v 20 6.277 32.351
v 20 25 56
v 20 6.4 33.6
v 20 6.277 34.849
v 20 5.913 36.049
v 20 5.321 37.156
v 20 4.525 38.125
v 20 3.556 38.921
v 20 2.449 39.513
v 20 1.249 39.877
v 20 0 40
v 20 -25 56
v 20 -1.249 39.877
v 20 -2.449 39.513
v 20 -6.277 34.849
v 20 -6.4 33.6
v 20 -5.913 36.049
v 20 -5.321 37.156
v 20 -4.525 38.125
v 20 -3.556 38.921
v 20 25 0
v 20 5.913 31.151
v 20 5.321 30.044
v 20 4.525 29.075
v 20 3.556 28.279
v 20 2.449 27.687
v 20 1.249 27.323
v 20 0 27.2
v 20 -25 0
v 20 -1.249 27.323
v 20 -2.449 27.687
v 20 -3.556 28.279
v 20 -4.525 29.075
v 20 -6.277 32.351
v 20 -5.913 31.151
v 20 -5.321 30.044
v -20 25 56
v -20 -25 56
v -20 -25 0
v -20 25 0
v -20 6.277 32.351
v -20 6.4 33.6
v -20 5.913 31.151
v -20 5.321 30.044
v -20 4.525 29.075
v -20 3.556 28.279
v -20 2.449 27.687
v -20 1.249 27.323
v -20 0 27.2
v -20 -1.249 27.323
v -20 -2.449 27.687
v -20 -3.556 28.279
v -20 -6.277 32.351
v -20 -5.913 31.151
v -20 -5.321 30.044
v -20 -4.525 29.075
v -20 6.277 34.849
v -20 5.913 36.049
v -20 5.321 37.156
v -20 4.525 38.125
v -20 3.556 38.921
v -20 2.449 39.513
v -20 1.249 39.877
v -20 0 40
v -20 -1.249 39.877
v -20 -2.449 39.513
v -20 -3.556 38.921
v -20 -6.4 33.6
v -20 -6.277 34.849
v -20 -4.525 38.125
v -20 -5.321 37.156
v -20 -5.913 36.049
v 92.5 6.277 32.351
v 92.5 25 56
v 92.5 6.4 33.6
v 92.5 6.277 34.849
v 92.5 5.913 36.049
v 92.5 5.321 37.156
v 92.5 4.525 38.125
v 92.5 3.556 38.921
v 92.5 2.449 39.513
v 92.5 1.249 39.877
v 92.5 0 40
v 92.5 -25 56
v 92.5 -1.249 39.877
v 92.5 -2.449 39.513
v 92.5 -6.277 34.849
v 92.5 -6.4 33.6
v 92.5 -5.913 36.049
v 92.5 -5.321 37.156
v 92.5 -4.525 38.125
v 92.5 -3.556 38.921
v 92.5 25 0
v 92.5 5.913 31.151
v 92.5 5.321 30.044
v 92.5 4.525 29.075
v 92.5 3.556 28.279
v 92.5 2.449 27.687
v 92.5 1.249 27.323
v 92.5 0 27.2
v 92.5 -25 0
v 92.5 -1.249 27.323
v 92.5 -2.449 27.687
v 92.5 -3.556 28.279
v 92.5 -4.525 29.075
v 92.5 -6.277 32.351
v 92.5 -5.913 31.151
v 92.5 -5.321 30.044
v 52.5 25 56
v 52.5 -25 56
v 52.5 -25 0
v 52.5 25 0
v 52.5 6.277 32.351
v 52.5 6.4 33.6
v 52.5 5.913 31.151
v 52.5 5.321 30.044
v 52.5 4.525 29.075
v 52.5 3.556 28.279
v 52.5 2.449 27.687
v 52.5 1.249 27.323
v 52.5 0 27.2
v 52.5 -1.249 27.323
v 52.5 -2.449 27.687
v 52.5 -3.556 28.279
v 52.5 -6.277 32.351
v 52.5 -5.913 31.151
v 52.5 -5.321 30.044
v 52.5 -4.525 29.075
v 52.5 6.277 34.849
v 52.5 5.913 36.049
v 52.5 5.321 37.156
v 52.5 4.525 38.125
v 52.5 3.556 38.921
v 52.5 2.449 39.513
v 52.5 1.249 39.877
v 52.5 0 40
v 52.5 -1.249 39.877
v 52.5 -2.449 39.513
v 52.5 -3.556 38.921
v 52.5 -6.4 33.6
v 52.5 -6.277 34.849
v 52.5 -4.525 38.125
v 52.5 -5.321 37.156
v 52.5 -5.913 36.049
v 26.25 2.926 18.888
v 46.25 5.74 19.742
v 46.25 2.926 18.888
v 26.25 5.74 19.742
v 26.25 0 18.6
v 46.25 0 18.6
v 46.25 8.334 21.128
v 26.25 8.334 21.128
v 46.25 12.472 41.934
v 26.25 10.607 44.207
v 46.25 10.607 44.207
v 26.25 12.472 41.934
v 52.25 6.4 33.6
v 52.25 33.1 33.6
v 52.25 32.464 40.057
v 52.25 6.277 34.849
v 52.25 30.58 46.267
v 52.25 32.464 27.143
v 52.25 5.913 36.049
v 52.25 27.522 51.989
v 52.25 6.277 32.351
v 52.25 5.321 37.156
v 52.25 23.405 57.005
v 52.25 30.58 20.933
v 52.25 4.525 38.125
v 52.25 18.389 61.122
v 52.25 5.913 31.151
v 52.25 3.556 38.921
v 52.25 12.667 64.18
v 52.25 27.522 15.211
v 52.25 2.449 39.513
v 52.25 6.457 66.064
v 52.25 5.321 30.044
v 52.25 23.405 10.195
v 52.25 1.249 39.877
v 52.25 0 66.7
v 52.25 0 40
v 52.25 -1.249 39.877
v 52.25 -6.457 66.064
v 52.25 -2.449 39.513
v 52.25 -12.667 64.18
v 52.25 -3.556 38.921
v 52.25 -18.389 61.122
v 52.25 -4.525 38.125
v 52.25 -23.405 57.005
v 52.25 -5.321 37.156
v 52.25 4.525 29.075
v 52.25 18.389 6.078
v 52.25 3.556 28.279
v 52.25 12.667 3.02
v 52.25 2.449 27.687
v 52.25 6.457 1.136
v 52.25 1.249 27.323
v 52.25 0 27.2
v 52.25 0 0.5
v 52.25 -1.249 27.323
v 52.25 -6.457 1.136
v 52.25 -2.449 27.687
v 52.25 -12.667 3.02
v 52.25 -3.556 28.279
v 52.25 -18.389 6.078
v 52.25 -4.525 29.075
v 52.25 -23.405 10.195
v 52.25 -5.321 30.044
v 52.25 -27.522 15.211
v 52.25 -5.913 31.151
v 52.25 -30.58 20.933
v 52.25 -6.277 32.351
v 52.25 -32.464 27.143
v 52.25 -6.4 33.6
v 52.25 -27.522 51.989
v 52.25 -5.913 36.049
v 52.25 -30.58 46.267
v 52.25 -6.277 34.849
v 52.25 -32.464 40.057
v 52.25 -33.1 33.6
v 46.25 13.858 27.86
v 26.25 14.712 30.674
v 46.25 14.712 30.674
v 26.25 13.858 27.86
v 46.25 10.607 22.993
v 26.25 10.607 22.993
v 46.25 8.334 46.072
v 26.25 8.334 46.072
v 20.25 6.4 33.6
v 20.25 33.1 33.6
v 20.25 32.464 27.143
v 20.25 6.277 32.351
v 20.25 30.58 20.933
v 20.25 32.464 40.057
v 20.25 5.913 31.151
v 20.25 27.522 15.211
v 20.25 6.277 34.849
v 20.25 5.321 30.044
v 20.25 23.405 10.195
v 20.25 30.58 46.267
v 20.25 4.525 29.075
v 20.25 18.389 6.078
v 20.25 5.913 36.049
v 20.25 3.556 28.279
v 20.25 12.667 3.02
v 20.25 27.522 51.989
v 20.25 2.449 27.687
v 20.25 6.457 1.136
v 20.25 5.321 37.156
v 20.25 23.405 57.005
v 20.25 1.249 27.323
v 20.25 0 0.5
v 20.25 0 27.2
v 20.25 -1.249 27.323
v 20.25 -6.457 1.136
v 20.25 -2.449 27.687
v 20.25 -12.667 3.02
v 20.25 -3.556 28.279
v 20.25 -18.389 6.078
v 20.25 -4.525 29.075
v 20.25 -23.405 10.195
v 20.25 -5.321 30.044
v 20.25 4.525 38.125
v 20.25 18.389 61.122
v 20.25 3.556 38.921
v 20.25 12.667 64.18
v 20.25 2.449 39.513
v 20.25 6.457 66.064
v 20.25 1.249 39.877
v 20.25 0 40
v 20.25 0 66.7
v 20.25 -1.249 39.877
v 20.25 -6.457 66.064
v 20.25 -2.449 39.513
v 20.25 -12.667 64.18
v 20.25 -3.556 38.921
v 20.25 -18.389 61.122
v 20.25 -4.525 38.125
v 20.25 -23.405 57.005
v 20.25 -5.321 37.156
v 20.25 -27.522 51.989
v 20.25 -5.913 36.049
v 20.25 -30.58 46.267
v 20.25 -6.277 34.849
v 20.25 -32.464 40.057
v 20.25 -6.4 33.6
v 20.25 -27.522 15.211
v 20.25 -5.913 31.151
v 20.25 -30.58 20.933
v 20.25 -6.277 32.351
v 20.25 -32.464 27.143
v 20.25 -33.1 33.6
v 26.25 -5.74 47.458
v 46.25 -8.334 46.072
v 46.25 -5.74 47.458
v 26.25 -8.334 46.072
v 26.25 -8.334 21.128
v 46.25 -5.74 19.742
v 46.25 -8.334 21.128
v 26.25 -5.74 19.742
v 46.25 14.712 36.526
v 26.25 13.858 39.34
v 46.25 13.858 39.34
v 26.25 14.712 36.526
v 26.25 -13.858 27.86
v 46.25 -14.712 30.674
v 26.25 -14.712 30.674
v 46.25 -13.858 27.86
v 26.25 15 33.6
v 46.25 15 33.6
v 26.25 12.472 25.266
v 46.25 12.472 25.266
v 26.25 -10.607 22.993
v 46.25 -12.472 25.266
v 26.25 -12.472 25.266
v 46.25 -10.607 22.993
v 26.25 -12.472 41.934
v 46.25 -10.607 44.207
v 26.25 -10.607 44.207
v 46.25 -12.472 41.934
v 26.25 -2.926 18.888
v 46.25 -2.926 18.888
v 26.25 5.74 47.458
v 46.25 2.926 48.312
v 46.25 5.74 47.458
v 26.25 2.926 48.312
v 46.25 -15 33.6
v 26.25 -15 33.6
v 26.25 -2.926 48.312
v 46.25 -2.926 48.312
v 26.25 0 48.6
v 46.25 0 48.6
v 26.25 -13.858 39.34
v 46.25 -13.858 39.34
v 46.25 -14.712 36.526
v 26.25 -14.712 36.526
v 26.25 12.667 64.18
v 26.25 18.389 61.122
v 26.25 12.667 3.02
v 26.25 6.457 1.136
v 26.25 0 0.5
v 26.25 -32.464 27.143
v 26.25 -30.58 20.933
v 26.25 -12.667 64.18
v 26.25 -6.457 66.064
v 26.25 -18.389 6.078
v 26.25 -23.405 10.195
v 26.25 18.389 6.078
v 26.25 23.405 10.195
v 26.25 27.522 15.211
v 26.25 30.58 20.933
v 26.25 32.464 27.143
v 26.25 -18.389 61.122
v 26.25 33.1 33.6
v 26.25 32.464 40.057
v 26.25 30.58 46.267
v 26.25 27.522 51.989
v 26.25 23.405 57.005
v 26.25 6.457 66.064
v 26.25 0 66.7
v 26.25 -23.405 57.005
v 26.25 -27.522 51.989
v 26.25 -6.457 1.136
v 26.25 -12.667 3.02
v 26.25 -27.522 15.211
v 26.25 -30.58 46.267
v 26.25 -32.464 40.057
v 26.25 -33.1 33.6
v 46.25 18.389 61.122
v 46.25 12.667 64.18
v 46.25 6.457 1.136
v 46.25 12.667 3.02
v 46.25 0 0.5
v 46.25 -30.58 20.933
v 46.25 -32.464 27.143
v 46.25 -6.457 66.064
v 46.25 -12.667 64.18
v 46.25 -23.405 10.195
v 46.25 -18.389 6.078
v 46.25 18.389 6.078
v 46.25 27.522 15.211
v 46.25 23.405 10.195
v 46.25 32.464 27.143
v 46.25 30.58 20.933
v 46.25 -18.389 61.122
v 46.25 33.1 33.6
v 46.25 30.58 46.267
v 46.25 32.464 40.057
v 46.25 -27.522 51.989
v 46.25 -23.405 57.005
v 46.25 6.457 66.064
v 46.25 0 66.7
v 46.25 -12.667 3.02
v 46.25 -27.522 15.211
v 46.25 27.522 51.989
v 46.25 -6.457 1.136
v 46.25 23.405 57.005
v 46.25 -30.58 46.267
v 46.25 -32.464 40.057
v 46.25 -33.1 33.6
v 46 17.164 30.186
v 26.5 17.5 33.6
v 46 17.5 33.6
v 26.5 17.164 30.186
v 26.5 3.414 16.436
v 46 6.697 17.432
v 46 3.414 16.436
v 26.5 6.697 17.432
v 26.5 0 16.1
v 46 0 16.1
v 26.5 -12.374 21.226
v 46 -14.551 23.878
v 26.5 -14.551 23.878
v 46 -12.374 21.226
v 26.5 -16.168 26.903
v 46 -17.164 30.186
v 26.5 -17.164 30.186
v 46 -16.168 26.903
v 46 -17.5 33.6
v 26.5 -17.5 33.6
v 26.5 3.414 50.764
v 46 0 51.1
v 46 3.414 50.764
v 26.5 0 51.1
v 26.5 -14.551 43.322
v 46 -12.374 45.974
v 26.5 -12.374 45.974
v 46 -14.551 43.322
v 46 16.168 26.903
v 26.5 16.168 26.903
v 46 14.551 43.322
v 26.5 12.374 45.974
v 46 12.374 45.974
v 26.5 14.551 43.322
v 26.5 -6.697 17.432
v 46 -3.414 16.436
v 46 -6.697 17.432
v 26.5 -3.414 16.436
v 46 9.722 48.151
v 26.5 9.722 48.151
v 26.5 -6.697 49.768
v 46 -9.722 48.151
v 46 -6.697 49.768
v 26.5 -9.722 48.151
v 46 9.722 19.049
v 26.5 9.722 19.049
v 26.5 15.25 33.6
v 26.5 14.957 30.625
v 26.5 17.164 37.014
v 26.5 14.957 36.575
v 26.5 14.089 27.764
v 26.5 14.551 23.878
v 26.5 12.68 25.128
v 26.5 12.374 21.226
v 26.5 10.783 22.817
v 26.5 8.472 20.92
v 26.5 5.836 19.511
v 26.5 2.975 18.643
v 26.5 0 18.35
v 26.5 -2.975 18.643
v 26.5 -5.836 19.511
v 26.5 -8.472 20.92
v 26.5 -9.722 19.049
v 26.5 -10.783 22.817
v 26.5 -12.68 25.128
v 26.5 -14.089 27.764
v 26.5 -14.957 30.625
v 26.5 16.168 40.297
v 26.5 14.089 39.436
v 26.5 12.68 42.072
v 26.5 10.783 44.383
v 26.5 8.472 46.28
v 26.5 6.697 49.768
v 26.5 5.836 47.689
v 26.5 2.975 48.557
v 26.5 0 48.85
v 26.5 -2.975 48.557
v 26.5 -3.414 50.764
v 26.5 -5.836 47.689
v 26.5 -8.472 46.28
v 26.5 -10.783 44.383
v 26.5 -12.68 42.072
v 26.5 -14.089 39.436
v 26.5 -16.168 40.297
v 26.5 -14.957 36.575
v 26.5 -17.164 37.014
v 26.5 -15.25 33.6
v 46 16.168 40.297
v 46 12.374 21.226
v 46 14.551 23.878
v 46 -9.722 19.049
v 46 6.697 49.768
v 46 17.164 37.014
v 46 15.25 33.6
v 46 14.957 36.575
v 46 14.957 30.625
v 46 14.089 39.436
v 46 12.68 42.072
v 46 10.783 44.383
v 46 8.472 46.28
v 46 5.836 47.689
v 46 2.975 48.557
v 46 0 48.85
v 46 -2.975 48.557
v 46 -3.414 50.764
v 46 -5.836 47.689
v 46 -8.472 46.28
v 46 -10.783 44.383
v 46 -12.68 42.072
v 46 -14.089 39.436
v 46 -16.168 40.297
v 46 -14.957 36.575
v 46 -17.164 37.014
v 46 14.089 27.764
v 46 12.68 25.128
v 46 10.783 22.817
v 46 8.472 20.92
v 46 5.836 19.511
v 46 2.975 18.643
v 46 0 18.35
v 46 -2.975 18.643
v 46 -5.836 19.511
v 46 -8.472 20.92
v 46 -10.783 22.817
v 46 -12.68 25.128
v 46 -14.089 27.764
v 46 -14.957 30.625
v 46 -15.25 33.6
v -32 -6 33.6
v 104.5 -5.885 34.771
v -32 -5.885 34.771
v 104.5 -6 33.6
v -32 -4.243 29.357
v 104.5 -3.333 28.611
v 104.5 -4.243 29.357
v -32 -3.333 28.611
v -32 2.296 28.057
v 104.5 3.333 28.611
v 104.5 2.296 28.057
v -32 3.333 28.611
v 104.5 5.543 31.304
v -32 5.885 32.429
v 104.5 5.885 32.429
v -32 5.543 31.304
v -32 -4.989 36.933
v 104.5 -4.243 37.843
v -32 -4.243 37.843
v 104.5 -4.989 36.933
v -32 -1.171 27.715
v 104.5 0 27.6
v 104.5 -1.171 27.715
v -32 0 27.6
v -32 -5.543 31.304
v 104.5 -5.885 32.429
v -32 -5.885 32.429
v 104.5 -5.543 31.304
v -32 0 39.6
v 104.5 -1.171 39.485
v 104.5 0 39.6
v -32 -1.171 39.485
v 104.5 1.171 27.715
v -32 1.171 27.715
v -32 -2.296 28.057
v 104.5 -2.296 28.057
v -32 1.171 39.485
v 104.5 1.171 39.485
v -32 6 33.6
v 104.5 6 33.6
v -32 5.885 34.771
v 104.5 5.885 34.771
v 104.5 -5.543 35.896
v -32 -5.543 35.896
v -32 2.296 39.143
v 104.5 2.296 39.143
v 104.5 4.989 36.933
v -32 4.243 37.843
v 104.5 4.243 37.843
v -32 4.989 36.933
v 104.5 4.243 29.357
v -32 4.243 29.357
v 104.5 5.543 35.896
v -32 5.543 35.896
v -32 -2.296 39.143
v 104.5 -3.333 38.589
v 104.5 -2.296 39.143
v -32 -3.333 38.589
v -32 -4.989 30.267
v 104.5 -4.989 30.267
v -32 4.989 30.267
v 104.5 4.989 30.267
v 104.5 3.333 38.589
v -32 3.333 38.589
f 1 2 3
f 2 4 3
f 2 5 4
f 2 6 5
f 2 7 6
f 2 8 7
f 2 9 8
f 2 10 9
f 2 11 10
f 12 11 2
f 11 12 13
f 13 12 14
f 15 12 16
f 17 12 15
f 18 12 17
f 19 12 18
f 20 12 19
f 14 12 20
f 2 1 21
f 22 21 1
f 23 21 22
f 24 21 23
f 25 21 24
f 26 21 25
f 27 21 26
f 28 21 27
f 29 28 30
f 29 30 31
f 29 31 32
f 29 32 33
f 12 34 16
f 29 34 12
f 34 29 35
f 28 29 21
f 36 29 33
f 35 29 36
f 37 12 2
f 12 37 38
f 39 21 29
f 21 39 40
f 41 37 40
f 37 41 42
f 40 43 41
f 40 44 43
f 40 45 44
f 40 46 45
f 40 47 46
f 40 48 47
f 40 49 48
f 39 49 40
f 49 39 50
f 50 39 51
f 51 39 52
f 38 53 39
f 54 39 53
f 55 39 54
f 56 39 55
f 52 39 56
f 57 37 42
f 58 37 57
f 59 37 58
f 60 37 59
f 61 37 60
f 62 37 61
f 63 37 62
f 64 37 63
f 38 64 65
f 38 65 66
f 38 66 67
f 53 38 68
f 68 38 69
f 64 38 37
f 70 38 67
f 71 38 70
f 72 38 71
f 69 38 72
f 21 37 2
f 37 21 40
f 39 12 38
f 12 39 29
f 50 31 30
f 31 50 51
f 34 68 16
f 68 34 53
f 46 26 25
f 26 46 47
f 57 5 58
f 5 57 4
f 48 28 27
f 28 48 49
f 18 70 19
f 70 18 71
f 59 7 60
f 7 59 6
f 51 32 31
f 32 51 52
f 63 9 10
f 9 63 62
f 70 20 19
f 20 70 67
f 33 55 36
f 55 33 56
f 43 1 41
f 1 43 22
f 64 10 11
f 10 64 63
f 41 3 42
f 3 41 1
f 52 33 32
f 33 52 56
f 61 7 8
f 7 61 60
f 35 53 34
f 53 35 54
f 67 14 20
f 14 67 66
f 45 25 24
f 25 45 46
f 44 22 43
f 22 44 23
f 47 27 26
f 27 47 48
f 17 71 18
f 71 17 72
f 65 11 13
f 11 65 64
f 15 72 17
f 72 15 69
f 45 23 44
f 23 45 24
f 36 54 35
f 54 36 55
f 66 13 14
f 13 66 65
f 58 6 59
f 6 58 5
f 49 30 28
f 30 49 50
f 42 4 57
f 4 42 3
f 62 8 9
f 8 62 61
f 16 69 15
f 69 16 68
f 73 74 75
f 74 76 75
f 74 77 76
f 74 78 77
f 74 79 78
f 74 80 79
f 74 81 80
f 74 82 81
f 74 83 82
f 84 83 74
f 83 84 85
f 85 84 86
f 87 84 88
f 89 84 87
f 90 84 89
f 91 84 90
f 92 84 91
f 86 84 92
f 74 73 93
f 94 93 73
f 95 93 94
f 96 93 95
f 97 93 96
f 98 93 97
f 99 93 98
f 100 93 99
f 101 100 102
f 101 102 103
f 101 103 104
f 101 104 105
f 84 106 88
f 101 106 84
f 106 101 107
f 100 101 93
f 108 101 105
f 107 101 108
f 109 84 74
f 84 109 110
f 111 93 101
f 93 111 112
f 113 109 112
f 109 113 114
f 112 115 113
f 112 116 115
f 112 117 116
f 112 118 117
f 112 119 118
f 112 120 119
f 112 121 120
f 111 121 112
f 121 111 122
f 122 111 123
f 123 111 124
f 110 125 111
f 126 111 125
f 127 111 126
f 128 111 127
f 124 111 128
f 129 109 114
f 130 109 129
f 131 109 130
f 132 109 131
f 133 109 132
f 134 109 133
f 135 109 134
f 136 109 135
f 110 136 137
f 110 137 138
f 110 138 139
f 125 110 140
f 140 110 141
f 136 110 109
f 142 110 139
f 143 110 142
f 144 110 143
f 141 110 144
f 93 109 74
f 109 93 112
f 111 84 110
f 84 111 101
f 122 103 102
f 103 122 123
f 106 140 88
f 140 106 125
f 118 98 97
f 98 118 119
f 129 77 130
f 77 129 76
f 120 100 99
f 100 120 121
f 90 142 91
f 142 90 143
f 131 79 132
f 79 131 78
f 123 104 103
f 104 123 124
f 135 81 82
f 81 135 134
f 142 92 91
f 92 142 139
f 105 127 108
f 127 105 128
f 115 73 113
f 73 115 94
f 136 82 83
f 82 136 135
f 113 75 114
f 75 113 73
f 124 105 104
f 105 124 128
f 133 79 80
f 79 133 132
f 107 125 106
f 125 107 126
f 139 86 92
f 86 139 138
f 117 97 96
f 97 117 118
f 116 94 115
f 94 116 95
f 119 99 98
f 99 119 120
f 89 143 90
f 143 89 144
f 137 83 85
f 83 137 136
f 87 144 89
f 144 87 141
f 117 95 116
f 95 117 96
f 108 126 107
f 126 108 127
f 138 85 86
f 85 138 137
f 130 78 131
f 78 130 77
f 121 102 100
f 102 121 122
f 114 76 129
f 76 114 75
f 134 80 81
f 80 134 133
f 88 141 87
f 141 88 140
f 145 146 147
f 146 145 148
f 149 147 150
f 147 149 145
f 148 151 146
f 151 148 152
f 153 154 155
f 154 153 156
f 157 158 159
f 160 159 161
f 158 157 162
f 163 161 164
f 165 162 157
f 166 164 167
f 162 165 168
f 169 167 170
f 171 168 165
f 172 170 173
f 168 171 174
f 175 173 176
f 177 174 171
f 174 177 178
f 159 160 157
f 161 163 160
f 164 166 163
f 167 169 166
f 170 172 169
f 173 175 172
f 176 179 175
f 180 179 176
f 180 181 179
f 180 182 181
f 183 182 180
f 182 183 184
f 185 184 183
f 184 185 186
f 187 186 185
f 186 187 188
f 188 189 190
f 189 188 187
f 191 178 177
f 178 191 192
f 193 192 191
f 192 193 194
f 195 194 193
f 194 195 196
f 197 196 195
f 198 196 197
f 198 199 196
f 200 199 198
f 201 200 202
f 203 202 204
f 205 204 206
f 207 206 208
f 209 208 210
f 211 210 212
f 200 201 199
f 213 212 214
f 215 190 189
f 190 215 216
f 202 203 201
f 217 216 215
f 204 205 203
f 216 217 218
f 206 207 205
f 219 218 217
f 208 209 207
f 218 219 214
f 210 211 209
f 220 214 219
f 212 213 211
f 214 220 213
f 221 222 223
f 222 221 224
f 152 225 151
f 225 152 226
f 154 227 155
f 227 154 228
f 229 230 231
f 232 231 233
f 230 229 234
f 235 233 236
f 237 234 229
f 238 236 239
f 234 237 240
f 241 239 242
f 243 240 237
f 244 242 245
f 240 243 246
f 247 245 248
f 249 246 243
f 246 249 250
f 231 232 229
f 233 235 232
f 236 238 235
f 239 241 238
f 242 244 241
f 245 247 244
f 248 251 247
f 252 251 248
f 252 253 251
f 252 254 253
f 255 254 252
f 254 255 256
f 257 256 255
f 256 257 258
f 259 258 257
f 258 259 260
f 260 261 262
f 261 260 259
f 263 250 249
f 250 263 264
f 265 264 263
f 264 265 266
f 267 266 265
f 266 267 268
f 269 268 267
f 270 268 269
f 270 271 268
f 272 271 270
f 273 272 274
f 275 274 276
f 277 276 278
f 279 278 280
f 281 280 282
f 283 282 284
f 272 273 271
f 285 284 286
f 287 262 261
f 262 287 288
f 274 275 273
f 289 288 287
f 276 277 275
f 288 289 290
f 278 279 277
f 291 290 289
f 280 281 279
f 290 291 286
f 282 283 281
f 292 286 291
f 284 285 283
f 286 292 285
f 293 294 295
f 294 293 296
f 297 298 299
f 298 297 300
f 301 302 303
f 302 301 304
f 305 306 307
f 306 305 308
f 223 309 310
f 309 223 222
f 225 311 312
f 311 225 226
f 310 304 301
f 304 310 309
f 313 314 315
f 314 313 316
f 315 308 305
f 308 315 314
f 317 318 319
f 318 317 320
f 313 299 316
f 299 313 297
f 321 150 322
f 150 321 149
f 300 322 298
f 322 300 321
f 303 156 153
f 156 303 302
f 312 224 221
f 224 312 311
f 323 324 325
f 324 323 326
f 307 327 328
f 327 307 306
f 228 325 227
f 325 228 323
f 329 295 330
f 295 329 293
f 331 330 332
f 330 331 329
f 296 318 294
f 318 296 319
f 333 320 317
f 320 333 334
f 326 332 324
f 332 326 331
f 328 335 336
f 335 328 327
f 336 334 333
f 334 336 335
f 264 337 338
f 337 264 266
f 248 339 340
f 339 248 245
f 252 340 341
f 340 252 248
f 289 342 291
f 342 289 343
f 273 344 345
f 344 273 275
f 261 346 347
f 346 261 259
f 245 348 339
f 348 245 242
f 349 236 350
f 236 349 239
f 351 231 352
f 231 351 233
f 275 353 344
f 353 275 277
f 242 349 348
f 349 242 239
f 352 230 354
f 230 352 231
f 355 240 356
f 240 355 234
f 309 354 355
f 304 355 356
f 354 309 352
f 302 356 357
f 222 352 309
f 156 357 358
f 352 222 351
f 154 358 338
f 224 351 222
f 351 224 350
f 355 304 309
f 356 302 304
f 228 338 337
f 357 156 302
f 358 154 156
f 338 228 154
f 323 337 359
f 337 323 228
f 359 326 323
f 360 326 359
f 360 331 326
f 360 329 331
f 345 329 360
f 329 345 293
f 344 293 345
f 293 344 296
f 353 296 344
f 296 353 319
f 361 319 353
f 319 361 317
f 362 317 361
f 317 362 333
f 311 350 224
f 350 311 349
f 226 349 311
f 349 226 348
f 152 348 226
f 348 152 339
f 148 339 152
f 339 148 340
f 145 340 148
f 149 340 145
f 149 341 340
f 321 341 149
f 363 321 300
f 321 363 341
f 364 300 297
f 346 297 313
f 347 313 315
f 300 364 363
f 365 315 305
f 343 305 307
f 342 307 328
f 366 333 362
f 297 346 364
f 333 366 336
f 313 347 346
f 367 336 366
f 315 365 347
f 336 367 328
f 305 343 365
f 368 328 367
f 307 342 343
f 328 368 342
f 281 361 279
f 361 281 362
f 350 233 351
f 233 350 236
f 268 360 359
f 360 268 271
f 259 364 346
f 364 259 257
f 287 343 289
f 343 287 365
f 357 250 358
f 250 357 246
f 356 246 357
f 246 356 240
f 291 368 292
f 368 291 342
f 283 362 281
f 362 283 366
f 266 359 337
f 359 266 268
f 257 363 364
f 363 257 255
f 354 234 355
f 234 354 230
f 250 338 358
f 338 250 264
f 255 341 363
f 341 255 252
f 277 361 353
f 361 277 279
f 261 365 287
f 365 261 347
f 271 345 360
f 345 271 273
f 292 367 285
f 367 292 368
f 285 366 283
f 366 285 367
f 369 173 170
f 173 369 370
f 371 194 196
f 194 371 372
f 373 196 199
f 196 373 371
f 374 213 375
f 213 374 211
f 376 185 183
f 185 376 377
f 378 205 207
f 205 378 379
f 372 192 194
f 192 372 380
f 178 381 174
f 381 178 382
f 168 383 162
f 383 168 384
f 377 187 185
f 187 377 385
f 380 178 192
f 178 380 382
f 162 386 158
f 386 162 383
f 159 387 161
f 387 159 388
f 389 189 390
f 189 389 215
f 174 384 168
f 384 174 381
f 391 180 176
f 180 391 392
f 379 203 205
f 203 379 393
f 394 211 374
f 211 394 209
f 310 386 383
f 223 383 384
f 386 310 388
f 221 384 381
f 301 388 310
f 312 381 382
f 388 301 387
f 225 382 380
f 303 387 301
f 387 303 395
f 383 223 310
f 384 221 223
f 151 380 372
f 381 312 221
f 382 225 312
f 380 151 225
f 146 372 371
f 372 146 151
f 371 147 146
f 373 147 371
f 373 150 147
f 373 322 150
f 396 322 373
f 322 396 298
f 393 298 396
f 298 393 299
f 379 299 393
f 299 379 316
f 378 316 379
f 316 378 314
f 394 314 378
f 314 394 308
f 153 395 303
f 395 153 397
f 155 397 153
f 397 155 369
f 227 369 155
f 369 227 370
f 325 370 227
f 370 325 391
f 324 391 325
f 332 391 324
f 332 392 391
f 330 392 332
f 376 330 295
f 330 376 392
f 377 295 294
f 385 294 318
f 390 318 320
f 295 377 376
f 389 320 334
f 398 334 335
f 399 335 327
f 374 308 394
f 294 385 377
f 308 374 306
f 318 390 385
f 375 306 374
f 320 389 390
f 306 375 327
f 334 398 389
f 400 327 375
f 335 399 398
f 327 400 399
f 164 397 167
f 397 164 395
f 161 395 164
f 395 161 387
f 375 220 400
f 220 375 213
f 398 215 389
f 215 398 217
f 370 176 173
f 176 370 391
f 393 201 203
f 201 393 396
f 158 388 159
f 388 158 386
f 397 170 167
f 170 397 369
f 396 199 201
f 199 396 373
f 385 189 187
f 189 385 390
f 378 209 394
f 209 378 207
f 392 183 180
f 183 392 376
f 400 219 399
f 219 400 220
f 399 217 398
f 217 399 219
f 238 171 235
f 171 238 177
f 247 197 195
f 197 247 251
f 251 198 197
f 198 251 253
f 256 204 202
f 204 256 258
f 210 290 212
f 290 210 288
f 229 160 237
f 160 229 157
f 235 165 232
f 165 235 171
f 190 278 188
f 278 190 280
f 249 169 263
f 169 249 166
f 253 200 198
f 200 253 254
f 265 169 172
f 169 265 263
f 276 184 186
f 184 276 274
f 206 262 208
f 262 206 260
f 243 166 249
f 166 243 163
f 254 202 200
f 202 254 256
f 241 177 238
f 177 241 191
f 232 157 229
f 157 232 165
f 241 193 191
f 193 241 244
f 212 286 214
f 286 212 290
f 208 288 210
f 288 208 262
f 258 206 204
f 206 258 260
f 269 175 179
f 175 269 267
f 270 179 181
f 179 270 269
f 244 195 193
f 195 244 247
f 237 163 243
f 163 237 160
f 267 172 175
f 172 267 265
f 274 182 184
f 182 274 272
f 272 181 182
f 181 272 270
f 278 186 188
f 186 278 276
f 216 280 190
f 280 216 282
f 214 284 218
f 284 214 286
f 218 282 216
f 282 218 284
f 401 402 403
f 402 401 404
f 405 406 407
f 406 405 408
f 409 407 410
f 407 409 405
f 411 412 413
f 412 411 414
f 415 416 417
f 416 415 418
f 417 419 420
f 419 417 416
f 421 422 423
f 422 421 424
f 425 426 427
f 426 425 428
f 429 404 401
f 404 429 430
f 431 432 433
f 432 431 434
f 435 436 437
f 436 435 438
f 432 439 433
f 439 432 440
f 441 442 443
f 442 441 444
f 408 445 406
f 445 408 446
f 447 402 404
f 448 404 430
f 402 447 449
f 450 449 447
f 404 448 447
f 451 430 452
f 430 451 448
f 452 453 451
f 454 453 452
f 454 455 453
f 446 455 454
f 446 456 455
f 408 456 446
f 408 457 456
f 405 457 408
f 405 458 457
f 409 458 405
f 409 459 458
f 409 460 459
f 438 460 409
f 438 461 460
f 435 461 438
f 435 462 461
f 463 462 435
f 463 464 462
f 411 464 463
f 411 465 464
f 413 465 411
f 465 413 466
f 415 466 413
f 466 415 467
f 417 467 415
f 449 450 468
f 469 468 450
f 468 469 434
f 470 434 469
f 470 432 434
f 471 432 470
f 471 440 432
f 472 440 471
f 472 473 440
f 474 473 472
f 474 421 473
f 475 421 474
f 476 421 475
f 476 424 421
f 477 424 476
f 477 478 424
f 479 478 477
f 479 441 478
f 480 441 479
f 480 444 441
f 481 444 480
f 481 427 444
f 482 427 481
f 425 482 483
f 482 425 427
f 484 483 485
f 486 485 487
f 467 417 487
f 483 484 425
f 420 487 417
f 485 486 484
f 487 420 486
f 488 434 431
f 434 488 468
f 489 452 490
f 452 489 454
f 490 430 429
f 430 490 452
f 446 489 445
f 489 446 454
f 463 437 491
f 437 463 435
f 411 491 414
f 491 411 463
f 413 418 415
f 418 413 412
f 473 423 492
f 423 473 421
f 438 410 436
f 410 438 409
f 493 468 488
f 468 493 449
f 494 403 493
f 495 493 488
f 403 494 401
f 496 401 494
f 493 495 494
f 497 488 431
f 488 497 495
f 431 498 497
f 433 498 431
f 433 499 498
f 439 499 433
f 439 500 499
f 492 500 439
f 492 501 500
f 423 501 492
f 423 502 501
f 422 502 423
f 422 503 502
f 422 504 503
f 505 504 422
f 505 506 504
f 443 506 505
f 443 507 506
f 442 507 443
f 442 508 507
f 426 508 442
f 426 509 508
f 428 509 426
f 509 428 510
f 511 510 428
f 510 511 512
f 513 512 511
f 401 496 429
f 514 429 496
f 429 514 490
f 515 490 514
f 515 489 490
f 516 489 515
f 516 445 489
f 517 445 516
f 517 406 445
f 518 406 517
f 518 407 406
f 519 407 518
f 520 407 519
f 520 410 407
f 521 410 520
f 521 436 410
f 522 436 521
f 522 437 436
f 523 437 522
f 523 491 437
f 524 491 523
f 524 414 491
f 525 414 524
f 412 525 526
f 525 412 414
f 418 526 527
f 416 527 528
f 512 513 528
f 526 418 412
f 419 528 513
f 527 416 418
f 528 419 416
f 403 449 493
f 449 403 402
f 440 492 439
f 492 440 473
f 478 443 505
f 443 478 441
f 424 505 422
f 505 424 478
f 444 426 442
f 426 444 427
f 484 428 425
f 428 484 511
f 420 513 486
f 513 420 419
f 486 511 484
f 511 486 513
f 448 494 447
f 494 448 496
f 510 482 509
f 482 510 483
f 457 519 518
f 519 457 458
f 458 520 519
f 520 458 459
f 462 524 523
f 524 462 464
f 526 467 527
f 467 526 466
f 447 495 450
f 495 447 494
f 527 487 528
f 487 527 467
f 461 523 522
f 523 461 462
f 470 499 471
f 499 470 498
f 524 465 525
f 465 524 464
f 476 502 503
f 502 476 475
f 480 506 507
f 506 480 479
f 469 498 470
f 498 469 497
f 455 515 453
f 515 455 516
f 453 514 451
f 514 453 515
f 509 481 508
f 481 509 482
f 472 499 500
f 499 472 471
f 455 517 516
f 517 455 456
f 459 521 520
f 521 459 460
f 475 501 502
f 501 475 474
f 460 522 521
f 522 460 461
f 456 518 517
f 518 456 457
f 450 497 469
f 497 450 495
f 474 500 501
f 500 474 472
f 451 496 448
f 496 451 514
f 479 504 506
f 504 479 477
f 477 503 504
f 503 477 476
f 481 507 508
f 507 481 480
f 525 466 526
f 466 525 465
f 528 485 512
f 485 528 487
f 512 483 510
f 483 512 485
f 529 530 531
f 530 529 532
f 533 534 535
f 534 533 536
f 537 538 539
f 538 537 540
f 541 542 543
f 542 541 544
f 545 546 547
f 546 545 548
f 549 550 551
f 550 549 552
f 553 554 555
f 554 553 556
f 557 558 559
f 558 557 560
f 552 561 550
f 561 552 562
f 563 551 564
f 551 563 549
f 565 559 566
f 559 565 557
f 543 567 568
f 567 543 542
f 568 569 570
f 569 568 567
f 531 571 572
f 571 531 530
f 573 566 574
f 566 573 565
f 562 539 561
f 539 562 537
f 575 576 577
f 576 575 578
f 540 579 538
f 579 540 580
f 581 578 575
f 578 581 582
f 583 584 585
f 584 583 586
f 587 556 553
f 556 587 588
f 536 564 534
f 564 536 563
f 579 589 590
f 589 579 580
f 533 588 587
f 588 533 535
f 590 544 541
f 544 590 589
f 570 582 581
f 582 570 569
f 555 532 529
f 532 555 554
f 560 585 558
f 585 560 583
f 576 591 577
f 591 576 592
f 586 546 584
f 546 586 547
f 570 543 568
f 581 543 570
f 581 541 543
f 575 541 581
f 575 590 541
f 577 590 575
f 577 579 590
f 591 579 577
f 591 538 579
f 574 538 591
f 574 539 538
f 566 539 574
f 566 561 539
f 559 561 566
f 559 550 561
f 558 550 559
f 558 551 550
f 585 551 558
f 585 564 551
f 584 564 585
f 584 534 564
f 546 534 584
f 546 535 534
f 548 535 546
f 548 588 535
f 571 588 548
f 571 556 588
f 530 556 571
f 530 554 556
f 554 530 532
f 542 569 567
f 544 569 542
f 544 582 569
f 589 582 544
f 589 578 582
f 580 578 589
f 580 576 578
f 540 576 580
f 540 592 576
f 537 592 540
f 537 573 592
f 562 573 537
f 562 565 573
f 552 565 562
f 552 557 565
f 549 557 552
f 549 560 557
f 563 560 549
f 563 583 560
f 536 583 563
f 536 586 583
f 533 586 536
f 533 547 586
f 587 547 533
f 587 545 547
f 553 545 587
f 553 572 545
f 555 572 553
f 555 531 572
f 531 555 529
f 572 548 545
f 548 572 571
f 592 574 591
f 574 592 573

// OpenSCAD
$fn = 32;

// ------------------------------------------------------------------------
// Pulley assembly: d66.2 pulley with a belt, shaft d12
// Every part is its own module, assembly() places them once.
// ------------------------------------------------------------------------

// --- part 1 ---
module support1() {
  difference() {
    translate([-20, -25, 0]) cube([40, 50, 56]);
    translate([0, 0, 33.6]) rotate([0, 90, 0]) cylinder(h = 42, d = 12.8, center = true);
  }
}

// --- part 2 ---
module support2() {
  difference() {
    translate([-20, -25, 0]) cube([40, 50, 56]);
    translate([0, 0, 33.6]) rotate([0, 90, 0]) cylinder(h = 42, d = 12.8, center = true);
  }
}

// --- part 3 ---
module shaft() {
  translate([0, 0, -68.25]) cylinder(h = 136.5, d = 12);
}

// --- part 4 ---
module pulley() {
  difference() {
    union() {
      cylinder(h = 32, d = 30);
      cylinder(h = 6, d = 66.2);
      translate([0, 0, 26]) cylinder(h = 6, d = 66.2);
    }
    translate([0, 0, -1]) cylinder(h = 34, d = 12.8);
  }
}

// --- part 5 ---
module belt() {
  difference() {
      translate([0, 0, 0]) cylinder(h = 19.5, d = 35);
      translate([0, 0, -1]) cylinder(h = 21.5, d = 30.5);
    }
}

// --- assembly ---
module assembly() {
  translate([0, 0, 0]) rotate([0, 0, 0]) support1();
  translate([72.5, 0, 0]) rotate([0, 0, 0]) support2();
  translate([36.25, 0, 33.6]) rotate([0, 90, 0]) shaft();
  translate([20.25, 0, 33.6]) rotate([0, 90, 0]) pulley();
  translate([26.5, 0, 33.6]) rotate([0, 90, 0]) belt();
}

assembly();
